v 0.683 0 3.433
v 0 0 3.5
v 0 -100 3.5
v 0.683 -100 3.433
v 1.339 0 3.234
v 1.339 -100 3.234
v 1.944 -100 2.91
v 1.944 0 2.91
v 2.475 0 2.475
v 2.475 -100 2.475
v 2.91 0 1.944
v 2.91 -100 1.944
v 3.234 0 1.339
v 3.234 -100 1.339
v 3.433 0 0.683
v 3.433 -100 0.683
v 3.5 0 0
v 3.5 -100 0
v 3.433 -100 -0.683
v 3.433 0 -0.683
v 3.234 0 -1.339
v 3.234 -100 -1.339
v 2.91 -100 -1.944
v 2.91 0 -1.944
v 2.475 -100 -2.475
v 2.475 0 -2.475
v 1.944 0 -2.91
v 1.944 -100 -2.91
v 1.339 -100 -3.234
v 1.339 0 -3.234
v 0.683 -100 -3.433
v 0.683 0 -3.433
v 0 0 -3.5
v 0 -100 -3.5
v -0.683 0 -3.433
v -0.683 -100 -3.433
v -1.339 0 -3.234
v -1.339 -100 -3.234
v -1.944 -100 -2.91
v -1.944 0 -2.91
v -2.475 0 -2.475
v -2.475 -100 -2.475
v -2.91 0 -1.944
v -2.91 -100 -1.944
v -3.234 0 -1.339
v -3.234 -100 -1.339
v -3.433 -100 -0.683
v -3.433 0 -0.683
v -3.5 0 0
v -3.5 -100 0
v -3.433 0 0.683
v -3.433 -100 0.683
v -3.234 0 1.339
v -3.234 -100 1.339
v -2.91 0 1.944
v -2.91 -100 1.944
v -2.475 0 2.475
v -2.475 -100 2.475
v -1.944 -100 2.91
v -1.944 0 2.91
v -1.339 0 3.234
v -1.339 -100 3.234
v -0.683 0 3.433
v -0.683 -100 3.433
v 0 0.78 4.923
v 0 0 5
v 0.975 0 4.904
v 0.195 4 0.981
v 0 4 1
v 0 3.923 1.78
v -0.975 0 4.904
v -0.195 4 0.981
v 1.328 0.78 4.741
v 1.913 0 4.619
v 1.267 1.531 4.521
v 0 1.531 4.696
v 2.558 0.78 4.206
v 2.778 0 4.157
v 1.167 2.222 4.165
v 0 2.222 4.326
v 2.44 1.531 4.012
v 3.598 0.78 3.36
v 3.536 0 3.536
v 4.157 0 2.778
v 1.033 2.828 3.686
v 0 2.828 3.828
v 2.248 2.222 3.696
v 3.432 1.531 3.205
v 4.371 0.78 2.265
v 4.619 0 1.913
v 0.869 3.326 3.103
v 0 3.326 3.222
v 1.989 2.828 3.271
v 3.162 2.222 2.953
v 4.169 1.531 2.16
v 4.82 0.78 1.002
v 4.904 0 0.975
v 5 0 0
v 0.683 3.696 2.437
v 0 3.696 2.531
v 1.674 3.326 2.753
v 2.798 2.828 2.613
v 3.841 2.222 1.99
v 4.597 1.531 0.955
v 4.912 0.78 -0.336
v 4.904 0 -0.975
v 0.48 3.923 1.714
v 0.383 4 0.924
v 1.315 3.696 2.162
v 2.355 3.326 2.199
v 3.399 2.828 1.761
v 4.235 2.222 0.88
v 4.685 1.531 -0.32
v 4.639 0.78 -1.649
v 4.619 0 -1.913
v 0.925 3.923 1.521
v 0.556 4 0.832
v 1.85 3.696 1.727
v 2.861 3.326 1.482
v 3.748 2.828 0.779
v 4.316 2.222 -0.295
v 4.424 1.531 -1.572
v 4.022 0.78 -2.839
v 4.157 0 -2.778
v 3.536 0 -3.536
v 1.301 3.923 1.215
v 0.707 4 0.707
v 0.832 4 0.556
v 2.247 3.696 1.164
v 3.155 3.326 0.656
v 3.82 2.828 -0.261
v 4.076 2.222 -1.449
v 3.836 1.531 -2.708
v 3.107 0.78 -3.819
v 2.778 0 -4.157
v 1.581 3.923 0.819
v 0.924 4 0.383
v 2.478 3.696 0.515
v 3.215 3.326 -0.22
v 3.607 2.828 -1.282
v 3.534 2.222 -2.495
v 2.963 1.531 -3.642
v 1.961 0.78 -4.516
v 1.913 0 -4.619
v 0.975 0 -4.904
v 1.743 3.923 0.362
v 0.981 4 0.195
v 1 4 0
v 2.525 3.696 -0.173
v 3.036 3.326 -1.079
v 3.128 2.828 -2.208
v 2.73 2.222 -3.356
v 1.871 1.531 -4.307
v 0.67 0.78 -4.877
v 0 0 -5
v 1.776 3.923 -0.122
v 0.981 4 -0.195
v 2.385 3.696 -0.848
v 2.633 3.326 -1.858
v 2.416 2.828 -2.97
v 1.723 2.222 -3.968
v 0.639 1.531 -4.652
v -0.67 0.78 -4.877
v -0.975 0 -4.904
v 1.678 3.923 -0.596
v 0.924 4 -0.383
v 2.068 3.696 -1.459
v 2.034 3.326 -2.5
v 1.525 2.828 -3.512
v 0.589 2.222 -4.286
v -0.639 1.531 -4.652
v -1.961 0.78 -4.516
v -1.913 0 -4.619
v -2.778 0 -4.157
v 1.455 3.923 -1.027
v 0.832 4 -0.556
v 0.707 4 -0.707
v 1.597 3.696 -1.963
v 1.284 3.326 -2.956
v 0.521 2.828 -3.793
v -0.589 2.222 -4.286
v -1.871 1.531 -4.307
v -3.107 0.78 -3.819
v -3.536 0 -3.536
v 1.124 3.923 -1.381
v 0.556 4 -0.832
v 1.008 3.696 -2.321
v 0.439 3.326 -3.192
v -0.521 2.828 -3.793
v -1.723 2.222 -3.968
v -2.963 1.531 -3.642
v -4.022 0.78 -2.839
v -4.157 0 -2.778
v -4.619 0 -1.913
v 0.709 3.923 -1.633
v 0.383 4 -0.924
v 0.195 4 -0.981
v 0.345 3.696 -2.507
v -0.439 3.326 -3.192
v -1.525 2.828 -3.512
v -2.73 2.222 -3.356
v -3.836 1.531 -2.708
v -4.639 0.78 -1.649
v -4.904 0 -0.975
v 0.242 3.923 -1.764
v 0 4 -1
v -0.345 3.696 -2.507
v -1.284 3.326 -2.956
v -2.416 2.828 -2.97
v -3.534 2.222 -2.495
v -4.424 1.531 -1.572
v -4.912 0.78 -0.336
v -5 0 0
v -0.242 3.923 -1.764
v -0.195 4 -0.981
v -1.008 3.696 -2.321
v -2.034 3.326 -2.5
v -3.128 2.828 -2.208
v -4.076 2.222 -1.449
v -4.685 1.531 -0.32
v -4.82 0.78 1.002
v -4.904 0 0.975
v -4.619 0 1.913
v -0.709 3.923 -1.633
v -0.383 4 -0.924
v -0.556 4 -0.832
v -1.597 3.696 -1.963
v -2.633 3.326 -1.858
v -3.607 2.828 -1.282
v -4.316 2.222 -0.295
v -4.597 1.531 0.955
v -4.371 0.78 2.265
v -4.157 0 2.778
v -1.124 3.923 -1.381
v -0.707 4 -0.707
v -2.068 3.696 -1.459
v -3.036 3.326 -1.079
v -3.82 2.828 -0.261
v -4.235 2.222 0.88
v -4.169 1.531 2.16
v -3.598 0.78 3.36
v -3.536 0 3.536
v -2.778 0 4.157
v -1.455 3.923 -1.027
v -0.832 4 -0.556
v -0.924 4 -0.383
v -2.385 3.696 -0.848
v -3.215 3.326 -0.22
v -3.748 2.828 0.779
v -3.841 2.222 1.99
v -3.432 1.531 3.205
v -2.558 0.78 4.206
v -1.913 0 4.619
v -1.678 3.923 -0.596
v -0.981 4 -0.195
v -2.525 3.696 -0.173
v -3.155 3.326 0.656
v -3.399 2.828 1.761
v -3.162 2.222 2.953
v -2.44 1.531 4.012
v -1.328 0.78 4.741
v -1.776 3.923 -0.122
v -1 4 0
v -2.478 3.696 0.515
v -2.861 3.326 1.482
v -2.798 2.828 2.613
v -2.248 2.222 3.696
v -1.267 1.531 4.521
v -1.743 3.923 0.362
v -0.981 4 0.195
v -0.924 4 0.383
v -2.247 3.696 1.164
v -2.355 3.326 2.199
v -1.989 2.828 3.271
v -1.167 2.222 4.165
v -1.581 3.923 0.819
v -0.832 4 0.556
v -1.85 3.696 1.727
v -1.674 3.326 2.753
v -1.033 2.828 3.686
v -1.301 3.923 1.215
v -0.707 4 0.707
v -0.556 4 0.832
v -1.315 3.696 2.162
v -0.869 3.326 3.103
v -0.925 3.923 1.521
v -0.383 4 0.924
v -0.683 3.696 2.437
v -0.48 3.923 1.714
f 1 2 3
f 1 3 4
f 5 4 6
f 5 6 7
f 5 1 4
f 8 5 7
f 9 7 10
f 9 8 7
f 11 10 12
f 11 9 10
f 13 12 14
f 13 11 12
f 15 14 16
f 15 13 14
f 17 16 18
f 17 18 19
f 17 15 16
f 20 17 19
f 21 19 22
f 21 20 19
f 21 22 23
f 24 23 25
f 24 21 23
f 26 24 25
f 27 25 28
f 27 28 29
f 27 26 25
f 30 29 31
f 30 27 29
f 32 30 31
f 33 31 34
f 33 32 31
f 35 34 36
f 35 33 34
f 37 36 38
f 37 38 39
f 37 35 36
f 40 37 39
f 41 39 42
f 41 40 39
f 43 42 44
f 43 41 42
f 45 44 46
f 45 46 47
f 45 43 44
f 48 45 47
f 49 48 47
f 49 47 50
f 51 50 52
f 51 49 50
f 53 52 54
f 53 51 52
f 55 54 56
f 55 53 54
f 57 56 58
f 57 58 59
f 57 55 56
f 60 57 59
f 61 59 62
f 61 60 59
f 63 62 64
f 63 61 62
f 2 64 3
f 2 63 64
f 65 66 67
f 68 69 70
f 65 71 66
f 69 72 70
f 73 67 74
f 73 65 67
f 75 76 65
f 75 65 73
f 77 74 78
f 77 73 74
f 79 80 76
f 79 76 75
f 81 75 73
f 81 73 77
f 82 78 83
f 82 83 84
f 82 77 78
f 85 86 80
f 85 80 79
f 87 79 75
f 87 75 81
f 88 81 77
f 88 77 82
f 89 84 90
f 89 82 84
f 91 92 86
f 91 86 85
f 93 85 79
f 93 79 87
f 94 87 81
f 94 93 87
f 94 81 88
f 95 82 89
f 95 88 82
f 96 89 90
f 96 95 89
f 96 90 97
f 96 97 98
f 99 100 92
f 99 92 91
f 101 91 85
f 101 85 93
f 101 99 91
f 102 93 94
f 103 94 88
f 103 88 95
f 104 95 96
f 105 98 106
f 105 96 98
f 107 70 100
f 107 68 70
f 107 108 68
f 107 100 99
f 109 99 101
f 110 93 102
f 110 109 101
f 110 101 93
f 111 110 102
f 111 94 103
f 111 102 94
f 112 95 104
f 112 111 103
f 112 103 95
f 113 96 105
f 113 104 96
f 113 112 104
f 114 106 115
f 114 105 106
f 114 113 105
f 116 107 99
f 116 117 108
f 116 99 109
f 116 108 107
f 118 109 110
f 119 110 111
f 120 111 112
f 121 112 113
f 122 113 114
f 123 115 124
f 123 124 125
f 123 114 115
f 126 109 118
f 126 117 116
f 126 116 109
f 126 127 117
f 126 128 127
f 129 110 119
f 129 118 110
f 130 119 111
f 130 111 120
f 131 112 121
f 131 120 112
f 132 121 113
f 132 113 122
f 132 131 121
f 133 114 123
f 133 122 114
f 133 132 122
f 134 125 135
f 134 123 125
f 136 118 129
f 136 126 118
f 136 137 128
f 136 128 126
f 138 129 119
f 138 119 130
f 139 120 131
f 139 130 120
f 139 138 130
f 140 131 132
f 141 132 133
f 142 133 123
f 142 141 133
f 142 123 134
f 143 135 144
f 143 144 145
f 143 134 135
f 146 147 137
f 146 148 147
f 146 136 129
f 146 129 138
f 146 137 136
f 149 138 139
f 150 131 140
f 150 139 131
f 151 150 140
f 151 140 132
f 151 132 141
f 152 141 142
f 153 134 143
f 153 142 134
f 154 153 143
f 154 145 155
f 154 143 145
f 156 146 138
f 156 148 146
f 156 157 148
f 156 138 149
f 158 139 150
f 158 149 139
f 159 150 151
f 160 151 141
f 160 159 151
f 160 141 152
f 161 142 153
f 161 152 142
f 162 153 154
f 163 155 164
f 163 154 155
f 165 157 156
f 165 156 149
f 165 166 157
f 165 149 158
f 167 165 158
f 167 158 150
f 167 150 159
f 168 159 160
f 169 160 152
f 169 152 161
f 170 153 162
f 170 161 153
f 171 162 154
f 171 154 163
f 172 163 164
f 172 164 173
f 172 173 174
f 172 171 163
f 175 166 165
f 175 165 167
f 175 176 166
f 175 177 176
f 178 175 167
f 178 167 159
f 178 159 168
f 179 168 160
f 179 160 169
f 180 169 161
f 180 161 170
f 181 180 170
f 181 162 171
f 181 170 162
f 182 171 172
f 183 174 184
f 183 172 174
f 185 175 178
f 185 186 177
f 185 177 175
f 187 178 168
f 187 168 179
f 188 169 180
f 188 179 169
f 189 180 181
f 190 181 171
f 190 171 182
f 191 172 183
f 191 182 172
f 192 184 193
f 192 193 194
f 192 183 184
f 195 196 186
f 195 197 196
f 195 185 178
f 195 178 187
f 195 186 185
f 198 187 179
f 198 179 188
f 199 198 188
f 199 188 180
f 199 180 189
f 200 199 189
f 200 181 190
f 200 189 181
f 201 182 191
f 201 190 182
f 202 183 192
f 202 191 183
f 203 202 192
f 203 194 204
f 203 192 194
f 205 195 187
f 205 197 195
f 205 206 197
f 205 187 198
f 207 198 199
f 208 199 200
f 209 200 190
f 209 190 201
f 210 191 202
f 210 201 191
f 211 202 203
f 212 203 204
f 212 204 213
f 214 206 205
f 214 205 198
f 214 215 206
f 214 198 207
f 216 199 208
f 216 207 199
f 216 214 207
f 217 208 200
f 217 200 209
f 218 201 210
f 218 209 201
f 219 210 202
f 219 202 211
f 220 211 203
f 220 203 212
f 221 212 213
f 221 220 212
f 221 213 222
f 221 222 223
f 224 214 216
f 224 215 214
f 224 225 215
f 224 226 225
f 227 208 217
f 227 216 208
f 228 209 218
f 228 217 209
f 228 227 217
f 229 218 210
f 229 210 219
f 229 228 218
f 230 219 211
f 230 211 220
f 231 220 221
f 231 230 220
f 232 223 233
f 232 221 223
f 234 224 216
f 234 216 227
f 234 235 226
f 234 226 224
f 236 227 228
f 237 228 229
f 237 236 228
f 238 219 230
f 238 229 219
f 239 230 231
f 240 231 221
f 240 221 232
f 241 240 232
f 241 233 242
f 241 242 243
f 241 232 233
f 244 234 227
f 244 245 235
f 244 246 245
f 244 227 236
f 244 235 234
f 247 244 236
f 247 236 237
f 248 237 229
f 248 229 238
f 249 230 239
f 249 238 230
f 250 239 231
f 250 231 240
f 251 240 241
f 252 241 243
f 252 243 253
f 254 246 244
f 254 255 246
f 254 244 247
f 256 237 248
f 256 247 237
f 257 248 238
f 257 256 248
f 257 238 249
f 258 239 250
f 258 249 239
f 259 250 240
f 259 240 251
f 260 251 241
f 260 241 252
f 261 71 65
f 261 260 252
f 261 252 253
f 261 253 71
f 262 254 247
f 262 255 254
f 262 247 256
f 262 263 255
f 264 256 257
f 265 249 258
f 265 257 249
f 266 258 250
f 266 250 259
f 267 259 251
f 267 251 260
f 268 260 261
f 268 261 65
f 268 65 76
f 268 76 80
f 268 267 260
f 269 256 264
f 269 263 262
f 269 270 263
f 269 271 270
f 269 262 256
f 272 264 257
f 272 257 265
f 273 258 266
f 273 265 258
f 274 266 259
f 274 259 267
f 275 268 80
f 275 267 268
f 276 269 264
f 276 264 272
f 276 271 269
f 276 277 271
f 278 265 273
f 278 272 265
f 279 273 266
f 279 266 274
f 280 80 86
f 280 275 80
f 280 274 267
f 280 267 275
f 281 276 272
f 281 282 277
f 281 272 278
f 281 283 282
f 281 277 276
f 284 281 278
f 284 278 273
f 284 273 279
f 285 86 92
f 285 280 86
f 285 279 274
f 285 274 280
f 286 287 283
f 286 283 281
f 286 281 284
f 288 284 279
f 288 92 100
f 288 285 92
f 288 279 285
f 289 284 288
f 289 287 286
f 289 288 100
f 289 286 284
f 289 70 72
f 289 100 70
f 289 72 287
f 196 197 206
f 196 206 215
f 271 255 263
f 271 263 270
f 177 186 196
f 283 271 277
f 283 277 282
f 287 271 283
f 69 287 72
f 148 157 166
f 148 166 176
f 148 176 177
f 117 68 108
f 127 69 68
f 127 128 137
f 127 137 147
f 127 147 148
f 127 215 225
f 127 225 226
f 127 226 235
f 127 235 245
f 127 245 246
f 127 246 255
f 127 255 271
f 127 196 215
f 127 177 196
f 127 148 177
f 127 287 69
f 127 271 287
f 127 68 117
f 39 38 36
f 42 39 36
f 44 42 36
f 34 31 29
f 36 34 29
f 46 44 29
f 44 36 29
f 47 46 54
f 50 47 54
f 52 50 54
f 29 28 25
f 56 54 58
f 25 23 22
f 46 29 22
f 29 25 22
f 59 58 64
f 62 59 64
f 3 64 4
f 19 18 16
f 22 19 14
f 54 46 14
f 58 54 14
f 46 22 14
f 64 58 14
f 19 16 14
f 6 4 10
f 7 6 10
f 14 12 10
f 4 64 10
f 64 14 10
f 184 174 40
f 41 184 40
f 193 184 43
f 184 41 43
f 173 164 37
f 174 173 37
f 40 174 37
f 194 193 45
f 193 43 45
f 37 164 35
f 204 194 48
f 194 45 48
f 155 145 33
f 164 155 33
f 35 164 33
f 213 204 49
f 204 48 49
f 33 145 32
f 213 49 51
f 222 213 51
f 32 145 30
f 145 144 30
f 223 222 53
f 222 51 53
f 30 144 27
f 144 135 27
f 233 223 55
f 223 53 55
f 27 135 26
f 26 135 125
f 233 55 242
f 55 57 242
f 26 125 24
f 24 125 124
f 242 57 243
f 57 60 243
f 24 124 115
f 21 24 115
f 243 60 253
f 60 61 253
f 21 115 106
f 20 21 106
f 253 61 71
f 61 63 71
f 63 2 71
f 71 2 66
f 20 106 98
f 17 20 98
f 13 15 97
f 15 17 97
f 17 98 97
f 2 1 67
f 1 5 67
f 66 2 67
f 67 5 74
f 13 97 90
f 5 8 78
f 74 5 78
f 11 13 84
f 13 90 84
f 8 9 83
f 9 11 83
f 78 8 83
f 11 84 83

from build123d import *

# Parameters (mm, degrees)
SKETCH1_R           = 3.5
BOSS_EXTRUDE1_DEPTH = 100
SKETCH2_R           = 5
BOSS_EXTRUDE2_DEPTH = 4
FILLET3_R           = 4


with BuildPart() as part:
    # Sketch1 → Boss-Extrude1 (new body)
    with BuildSketch(Plane(origin=(0, 0, 0), x_dir=(1, 0, 0), z_dir=(0, 1, 0))):
        with Locations(Location((0, 0, 0), (0, 0, 270))):
            Circle(SKETCH1_R)
    extrude(amount=-BOSS_EXTRUDE1_DEPTH)

    # Sketch2 → Boss-Extrude2 (add)
    with BuildSketch(Plane(origin=(0, 0, 0), x_dir=(1, 0, 0), z_dir=(0, 1, 0))):
        with Locations(Location((0, 0, 0), (0, 0, 270))):
            Circle(SKETCH2_R)
    extrude(amount=BOSS_EXTRUDE2_DEPTH)

    # Fillet3
    fillet3_edges = [part.edges().sort_by_distance(p)[0] for p in [
        (0, 4, -5),
    ]]
    fillet(fillet3_edges, radius=FILLET3_R - 0.0001)  # a hair under: the kernel refuses the full size


solid = part.part
